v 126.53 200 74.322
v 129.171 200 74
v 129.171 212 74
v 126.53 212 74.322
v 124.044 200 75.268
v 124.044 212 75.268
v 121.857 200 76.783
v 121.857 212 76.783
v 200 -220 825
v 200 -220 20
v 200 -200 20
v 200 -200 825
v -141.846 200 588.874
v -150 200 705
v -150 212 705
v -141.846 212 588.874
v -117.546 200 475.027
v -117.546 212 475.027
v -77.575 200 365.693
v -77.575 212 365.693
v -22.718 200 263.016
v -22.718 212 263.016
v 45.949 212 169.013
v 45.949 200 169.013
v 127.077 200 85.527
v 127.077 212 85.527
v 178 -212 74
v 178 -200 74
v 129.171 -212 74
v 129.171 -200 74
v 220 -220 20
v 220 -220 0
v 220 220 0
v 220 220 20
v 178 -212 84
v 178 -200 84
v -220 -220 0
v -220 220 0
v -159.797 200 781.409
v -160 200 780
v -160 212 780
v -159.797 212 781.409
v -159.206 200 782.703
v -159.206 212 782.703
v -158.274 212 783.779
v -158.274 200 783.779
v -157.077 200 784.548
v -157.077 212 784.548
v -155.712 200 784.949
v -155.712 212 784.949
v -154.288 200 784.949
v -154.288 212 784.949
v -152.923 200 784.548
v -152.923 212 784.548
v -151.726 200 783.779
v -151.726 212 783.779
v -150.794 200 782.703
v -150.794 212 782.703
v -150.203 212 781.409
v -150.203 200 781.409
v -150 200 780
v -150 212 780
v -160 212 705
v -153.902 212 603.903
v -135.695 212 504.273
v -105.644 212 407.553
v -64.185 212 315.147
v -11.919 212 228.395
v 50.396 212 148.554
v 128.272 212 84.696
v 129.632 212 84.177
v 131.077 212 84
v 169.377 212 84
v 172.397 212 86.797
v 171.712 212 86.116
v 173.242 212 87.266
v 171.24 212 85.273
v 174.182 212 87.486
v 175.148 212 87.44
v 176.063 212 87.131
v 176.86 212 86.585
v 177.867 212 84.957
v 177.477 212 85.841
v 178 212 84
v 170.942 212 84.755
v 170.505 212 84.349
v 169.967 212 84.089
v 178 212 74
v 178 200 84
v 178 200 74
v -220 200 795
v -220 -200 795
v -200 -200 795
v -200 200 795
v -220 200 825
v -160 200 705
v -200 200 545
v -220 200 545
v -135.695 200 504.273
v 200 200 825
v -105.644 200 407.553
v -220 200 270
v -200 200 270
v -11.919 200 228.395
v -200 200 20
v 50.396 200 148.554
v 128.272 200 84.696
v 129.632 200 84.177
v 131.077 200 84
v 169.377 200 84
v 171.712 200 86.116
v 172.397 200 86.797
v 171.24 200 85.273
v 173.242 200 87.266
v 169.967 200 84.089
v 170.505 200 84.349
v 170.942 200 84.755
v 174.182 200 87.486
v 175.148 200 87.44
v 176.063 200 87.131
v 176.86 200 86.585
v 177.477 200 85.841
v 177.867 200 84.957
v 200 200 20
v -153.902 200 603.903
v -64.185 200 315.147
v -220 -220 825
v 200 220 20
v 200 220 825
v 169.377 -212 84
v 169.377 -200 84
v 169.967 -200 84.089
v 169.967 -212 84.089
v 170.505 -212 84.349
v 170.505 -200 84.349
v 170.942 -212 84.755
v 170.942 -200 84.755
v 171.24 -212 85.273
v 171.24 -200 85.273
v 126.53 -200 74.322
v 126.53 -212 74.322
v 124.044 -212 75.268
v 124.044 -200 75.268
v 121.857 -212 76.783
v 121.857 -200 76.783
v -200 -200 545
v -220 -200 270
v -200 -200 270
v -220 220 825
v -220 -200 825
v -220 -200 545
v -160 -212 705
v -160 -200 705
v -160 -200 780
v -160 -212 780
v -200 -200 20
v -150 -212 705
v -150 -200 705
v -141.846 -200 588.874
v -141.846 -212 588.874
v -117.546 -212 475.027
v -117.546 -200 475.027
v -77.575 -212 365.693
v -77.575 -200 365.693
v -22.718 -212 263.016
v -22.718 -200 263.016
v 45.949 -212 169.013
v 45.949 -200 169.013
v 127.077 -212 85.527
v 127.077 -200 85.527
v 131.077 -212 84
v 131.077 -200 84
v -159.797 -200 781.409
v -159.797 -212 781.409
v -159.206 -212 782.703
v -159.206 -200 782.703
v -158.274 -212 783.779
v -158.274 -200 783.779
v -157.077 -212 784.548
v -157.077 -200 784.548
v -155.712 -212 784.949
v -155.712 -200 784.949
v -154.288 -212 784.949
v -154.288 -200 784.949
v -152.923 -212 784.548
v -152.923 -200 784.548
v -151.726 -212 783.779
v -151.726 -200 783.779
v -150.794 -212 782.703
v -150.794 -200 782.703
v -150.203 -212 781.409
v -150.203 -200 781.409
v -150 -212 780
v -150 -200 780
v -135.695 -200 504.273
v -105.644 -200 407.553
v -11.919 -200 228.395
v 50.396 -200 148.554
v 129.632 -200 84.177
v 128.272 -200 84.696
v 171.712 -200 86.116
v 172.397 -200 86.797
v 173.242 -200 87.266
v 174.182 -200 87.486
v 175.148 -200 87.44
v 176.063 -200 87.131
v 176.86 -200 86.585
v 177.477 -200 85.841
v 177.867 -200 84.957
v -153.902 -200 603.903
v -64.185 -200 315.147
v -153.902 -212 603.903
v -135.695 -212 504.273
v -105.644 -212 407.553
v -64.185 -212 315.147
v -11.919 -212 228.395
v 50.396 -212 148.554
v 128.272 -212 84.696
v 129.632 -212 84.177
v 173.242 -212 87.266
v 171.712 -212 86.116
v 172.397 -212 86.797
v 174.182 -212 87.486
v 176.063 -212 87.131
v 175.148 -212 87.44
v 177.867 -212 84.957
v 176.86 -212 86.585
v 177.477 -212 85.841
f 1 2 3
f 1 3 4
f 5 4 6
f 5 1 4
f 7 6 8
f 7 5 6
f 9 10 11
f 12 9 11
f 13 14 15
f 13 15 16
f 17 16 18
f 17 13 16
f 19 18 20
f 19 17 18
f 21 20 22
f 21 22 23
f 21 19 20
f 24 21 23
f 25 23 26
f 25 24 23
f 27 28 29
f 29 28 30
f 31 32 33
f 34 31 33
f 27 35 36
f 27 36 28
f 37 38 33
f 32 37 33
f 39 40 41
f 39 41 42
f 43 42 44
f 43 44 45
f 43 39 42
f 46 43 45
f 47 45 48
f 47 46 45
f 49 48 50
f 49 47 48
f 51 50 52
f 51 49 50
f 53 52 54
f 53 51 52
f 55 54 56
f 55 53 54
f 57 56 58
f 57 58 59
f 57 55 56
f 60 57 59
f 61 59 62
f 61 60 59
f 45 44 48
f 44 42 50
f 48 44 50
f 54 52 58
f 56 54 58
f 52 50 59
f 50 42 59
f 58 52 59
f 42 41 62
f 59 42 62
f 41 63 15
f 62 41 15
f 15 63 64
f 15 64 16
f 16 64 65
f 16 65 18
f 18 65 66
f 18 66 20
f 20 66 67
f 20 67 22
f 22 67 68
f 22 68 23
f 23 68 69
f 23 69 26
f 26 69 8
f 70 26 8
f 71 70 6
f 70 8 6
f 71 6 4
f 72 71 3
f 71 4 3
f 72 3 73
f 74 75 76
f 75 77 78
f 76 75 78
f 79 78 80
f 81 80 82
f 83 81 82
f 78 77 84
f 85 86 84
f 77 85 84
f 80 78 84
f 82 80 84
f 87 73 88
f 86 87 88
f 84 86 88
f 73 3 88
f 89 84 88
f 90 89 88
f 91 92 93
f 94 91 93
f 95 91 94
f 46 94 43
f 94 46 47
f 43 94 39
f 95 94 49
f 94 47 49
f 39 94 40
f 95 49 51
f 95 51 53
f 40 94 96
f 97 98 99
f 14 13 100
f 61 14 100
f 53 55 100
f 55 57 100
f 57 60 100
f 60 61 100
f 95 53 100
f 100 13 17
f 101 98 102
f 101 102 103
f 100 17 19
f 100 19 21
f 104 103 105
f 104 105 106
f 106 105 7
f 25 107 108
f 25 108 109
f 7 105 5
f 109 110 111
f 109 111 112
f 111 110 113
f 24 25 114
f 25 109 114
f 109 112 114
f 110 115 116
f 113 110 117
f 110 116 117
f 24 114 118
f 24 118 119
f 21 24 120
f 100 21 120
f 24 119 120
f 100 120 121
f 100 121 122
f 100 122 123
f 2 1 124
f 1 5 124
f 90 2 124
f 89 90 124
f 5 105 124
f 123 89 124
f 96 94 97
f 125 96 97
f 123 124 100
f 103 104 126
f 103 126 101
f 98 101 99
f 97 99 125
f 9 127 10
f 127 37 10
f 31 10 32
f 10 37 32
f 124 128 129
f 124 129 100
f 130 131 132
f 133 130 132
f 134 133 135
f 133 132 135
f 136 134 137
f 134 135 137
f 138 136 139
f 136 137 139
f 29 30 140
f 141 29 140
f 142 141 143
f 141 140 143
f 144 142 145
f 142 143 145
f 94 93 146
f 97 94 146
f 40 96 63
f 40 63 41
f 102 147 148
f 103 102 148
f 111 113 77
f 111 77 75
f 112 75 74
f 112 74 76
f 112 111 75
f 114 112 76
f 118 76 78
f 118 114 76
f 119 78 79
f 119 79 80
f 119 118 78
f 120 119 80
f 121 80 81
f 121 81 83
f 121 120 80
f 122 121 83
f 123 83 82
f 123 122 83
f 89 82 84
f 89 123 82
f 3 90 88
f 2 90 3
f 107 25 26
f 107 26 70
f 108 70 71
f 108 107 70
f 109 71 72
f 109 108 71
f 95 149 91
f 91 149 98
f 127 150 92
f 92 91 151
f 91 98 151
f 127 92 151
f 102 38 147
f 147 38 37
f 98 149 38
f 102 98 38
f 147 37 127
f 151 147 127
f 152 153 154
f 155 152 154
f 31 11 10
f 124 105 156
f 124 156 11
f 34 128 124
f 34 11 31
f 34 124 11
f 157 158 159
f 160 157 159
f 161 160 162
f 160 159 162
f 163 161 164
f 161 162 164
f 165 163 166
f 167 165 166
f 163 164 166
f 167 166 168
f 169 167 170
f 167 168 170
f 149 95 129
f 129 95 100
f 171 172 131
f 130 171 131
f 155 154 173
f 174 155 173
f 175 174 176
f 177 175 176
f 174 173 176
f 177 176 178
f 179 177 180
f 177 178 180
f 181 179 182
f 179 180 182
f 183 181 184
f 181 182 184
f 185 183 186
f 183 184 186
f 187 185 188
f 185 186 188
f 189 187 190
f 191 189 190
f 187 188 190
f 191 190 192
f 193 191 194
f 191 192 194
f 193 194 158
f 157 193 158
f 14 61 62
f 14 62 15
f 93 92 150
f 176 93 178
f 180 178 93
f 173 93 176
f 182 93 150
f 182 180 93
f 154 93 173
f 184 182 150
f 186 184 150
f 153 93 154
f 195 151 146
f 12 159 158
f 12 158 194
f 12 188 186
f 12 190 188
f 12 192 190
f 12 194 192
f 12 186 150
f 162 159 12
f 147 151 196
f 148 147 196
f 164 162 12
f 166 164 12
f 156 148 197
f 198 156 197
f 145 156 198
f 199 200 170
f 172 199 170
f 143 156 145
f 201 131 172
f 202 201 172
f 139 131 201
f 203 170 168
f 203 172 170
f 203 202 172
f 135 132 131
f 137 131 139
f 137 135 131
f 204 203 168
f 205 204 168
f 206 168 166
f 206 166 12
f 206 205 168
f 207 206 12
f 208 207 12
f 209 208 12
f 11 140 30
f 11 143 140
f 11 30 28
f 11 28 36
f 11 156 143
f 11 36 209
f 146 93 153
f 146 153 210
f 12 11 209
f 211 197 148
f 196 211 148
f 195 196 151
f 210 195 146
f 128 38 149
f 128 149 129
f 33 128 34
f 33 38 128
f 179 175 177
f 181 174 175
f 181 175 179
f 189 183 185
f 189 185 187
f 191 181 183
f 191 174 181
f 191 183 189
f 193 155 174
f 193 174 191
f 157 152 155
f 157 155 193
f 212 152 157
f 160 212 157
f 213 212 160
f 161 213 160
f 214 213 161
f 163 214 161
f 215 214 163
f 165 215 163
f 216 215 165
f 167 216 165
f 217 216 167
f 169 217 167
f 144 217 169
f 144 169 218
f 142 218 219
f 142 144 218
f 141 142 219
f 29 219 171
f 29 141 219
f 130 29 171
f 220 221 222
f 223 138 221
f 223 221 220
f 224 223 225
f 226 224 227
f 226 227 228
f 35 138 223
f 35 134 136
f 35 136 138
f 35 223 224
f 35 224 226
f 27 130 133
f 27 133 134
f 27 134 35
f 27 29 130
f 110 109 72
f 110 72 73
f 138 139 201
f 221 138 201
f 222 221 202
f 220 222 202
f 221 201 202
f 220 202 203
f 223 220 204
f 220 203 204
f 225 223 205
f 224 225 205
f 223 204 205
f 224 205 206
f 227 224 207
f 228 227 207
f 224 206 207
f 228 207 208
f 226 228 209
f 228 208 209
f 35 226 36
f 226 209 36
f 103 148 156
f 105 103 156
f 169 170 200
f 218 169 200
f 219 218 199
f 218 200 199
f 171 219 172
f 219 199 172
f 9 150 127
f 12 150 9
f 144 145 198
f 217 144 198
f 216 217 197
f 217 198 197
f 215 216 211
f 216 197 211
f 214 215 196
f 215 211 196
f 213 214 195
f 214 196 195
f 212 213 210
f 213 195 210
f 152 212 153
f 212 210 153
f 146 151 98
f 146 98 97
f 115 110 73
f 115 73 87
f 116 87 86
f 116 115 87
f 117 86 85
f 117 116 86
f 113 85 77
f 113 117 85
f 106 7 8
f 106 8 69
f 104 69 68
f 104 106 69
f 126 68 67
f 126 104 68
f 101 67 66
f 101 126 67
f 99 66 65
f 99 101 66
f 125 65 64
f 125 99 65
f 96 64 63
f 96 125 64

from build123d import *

# Parameters (mm, degrees)
SKETCH1_W           = 440
SKETCH1_H           = 440
BOSS_EXTRUDE1_DEPTH = 20
SKETCH2_W           = 420
SKETCH2_H           = 20
BOSS_EXTRUDE2_DEPTH = 805
SKETCH3_W           = 20
SKETCH3_H           = 250
BOSS_EXTRUDE3_DEPTH = 400
SKETCH4_W           = 20
SKETCH4_H           = 250
BOSS_EXTRUDE4_DEPTH = 400
CUT_EXTRUDE1_DEPTH  = 12


with BuildPart() as part:
    # Sketch1 → Boss-Extrude1 (new body)
    with BuildSketch(Plane.XY):
        Rectangle(SKETCH1_W, SKETCH1_H)
    extrude(amount=BOSS_EXTRUDE1_DEPTH)

    # Sketch2 → Boss-Extrude2 (add)
    with BuildSketch(Plane.XY.offset(20)):
        with Locations((-10, -210)):
            Rectangle(SKETCH2_W, SKETCH2_H)
    boss_extrude2 = extrude(amount=BOSS_EXTRUDE2_DEPTH)

    # Sketch3 → Boss-Extrude3 (add)
    with BuildSketch(Plane(origin=(0, -200, 0), x_dir=(1, 0, 0), z_dir=(0, 1, 0))):
        with Locations((-210, -145)):
            Rectangle(SKETCH3_W, SKETCH3_H)
    extrude(amount=BOSS_EXTRUDE3_DEPTH)

    # Sketch4 → Boss-Extrude4 (add)
    with BuildSketch(Plane(origin=(0, -200, 0), x_dir=(1, 0, 0), z_dir=(0, 1, 0))):
        with Locations((-210, -670)):
            Rectangle(SKETCH4_W, SKETCH4_H)
    extrude(amount=BOSS_EXTRUDE4_DEPTH)

    # Sketch5 → Cut-Extrude1 (cut)
    with BuildSketch(Plane(origin=(0, -200, 0), x_dir=(1, 0, 0), z_dir=(0, 1, 0))):
        with BuildLine():
            ThreePointArc((-150, -705), (-77.574670949, -365.69256628), (127.077366481, -85.527424904))
            ThreePointArc((127.077366481, -85.527424904), (128.936250611, -84.394848326), (131.076875452, -84))
            Line((131.076875452, -84), (169.376524617, -84))
            ThreePointArc((169.376524617, -84), (170.504676767, -84.348554352), (171.239606574, -85.272727273))
            ThreePointArc((171.239606574, -85.272727273), (175.147542667, -87.43957679), (178, -84))
            Line((178, -84), (178, -74))
            Line((178, -74), (129.170663521, -74))
            ThreePointArc((129.170663521, -74), (125.25802282, -74.719375372), (121.857138002, -76.783410411))
            ThreePointArc((121.857138002, -76.783410411), (-86.307144971, -360.725571064), (-160, -705))
            Line((-160, -705), (-160, -780))
            ThreePointArc((-160, -780), (-155, -785), (-150, -780))
            Line((-150, -780), (-150, -705))
        make_face()
    cut_extrude1 = extrude(amount=-CUT_EXTRUDE1_DEPTH, mode=Mode.SUBTRACT)

    # Mirror1: Boss-Extrude2, Cut-Extrude1 across plane
    add(boss_extrude2.mirror(Plane.ZX))
    add(cut_extrude1.mirror(Plane.ZX), mode=Mode.SUBTRACT)


solid = part.part
